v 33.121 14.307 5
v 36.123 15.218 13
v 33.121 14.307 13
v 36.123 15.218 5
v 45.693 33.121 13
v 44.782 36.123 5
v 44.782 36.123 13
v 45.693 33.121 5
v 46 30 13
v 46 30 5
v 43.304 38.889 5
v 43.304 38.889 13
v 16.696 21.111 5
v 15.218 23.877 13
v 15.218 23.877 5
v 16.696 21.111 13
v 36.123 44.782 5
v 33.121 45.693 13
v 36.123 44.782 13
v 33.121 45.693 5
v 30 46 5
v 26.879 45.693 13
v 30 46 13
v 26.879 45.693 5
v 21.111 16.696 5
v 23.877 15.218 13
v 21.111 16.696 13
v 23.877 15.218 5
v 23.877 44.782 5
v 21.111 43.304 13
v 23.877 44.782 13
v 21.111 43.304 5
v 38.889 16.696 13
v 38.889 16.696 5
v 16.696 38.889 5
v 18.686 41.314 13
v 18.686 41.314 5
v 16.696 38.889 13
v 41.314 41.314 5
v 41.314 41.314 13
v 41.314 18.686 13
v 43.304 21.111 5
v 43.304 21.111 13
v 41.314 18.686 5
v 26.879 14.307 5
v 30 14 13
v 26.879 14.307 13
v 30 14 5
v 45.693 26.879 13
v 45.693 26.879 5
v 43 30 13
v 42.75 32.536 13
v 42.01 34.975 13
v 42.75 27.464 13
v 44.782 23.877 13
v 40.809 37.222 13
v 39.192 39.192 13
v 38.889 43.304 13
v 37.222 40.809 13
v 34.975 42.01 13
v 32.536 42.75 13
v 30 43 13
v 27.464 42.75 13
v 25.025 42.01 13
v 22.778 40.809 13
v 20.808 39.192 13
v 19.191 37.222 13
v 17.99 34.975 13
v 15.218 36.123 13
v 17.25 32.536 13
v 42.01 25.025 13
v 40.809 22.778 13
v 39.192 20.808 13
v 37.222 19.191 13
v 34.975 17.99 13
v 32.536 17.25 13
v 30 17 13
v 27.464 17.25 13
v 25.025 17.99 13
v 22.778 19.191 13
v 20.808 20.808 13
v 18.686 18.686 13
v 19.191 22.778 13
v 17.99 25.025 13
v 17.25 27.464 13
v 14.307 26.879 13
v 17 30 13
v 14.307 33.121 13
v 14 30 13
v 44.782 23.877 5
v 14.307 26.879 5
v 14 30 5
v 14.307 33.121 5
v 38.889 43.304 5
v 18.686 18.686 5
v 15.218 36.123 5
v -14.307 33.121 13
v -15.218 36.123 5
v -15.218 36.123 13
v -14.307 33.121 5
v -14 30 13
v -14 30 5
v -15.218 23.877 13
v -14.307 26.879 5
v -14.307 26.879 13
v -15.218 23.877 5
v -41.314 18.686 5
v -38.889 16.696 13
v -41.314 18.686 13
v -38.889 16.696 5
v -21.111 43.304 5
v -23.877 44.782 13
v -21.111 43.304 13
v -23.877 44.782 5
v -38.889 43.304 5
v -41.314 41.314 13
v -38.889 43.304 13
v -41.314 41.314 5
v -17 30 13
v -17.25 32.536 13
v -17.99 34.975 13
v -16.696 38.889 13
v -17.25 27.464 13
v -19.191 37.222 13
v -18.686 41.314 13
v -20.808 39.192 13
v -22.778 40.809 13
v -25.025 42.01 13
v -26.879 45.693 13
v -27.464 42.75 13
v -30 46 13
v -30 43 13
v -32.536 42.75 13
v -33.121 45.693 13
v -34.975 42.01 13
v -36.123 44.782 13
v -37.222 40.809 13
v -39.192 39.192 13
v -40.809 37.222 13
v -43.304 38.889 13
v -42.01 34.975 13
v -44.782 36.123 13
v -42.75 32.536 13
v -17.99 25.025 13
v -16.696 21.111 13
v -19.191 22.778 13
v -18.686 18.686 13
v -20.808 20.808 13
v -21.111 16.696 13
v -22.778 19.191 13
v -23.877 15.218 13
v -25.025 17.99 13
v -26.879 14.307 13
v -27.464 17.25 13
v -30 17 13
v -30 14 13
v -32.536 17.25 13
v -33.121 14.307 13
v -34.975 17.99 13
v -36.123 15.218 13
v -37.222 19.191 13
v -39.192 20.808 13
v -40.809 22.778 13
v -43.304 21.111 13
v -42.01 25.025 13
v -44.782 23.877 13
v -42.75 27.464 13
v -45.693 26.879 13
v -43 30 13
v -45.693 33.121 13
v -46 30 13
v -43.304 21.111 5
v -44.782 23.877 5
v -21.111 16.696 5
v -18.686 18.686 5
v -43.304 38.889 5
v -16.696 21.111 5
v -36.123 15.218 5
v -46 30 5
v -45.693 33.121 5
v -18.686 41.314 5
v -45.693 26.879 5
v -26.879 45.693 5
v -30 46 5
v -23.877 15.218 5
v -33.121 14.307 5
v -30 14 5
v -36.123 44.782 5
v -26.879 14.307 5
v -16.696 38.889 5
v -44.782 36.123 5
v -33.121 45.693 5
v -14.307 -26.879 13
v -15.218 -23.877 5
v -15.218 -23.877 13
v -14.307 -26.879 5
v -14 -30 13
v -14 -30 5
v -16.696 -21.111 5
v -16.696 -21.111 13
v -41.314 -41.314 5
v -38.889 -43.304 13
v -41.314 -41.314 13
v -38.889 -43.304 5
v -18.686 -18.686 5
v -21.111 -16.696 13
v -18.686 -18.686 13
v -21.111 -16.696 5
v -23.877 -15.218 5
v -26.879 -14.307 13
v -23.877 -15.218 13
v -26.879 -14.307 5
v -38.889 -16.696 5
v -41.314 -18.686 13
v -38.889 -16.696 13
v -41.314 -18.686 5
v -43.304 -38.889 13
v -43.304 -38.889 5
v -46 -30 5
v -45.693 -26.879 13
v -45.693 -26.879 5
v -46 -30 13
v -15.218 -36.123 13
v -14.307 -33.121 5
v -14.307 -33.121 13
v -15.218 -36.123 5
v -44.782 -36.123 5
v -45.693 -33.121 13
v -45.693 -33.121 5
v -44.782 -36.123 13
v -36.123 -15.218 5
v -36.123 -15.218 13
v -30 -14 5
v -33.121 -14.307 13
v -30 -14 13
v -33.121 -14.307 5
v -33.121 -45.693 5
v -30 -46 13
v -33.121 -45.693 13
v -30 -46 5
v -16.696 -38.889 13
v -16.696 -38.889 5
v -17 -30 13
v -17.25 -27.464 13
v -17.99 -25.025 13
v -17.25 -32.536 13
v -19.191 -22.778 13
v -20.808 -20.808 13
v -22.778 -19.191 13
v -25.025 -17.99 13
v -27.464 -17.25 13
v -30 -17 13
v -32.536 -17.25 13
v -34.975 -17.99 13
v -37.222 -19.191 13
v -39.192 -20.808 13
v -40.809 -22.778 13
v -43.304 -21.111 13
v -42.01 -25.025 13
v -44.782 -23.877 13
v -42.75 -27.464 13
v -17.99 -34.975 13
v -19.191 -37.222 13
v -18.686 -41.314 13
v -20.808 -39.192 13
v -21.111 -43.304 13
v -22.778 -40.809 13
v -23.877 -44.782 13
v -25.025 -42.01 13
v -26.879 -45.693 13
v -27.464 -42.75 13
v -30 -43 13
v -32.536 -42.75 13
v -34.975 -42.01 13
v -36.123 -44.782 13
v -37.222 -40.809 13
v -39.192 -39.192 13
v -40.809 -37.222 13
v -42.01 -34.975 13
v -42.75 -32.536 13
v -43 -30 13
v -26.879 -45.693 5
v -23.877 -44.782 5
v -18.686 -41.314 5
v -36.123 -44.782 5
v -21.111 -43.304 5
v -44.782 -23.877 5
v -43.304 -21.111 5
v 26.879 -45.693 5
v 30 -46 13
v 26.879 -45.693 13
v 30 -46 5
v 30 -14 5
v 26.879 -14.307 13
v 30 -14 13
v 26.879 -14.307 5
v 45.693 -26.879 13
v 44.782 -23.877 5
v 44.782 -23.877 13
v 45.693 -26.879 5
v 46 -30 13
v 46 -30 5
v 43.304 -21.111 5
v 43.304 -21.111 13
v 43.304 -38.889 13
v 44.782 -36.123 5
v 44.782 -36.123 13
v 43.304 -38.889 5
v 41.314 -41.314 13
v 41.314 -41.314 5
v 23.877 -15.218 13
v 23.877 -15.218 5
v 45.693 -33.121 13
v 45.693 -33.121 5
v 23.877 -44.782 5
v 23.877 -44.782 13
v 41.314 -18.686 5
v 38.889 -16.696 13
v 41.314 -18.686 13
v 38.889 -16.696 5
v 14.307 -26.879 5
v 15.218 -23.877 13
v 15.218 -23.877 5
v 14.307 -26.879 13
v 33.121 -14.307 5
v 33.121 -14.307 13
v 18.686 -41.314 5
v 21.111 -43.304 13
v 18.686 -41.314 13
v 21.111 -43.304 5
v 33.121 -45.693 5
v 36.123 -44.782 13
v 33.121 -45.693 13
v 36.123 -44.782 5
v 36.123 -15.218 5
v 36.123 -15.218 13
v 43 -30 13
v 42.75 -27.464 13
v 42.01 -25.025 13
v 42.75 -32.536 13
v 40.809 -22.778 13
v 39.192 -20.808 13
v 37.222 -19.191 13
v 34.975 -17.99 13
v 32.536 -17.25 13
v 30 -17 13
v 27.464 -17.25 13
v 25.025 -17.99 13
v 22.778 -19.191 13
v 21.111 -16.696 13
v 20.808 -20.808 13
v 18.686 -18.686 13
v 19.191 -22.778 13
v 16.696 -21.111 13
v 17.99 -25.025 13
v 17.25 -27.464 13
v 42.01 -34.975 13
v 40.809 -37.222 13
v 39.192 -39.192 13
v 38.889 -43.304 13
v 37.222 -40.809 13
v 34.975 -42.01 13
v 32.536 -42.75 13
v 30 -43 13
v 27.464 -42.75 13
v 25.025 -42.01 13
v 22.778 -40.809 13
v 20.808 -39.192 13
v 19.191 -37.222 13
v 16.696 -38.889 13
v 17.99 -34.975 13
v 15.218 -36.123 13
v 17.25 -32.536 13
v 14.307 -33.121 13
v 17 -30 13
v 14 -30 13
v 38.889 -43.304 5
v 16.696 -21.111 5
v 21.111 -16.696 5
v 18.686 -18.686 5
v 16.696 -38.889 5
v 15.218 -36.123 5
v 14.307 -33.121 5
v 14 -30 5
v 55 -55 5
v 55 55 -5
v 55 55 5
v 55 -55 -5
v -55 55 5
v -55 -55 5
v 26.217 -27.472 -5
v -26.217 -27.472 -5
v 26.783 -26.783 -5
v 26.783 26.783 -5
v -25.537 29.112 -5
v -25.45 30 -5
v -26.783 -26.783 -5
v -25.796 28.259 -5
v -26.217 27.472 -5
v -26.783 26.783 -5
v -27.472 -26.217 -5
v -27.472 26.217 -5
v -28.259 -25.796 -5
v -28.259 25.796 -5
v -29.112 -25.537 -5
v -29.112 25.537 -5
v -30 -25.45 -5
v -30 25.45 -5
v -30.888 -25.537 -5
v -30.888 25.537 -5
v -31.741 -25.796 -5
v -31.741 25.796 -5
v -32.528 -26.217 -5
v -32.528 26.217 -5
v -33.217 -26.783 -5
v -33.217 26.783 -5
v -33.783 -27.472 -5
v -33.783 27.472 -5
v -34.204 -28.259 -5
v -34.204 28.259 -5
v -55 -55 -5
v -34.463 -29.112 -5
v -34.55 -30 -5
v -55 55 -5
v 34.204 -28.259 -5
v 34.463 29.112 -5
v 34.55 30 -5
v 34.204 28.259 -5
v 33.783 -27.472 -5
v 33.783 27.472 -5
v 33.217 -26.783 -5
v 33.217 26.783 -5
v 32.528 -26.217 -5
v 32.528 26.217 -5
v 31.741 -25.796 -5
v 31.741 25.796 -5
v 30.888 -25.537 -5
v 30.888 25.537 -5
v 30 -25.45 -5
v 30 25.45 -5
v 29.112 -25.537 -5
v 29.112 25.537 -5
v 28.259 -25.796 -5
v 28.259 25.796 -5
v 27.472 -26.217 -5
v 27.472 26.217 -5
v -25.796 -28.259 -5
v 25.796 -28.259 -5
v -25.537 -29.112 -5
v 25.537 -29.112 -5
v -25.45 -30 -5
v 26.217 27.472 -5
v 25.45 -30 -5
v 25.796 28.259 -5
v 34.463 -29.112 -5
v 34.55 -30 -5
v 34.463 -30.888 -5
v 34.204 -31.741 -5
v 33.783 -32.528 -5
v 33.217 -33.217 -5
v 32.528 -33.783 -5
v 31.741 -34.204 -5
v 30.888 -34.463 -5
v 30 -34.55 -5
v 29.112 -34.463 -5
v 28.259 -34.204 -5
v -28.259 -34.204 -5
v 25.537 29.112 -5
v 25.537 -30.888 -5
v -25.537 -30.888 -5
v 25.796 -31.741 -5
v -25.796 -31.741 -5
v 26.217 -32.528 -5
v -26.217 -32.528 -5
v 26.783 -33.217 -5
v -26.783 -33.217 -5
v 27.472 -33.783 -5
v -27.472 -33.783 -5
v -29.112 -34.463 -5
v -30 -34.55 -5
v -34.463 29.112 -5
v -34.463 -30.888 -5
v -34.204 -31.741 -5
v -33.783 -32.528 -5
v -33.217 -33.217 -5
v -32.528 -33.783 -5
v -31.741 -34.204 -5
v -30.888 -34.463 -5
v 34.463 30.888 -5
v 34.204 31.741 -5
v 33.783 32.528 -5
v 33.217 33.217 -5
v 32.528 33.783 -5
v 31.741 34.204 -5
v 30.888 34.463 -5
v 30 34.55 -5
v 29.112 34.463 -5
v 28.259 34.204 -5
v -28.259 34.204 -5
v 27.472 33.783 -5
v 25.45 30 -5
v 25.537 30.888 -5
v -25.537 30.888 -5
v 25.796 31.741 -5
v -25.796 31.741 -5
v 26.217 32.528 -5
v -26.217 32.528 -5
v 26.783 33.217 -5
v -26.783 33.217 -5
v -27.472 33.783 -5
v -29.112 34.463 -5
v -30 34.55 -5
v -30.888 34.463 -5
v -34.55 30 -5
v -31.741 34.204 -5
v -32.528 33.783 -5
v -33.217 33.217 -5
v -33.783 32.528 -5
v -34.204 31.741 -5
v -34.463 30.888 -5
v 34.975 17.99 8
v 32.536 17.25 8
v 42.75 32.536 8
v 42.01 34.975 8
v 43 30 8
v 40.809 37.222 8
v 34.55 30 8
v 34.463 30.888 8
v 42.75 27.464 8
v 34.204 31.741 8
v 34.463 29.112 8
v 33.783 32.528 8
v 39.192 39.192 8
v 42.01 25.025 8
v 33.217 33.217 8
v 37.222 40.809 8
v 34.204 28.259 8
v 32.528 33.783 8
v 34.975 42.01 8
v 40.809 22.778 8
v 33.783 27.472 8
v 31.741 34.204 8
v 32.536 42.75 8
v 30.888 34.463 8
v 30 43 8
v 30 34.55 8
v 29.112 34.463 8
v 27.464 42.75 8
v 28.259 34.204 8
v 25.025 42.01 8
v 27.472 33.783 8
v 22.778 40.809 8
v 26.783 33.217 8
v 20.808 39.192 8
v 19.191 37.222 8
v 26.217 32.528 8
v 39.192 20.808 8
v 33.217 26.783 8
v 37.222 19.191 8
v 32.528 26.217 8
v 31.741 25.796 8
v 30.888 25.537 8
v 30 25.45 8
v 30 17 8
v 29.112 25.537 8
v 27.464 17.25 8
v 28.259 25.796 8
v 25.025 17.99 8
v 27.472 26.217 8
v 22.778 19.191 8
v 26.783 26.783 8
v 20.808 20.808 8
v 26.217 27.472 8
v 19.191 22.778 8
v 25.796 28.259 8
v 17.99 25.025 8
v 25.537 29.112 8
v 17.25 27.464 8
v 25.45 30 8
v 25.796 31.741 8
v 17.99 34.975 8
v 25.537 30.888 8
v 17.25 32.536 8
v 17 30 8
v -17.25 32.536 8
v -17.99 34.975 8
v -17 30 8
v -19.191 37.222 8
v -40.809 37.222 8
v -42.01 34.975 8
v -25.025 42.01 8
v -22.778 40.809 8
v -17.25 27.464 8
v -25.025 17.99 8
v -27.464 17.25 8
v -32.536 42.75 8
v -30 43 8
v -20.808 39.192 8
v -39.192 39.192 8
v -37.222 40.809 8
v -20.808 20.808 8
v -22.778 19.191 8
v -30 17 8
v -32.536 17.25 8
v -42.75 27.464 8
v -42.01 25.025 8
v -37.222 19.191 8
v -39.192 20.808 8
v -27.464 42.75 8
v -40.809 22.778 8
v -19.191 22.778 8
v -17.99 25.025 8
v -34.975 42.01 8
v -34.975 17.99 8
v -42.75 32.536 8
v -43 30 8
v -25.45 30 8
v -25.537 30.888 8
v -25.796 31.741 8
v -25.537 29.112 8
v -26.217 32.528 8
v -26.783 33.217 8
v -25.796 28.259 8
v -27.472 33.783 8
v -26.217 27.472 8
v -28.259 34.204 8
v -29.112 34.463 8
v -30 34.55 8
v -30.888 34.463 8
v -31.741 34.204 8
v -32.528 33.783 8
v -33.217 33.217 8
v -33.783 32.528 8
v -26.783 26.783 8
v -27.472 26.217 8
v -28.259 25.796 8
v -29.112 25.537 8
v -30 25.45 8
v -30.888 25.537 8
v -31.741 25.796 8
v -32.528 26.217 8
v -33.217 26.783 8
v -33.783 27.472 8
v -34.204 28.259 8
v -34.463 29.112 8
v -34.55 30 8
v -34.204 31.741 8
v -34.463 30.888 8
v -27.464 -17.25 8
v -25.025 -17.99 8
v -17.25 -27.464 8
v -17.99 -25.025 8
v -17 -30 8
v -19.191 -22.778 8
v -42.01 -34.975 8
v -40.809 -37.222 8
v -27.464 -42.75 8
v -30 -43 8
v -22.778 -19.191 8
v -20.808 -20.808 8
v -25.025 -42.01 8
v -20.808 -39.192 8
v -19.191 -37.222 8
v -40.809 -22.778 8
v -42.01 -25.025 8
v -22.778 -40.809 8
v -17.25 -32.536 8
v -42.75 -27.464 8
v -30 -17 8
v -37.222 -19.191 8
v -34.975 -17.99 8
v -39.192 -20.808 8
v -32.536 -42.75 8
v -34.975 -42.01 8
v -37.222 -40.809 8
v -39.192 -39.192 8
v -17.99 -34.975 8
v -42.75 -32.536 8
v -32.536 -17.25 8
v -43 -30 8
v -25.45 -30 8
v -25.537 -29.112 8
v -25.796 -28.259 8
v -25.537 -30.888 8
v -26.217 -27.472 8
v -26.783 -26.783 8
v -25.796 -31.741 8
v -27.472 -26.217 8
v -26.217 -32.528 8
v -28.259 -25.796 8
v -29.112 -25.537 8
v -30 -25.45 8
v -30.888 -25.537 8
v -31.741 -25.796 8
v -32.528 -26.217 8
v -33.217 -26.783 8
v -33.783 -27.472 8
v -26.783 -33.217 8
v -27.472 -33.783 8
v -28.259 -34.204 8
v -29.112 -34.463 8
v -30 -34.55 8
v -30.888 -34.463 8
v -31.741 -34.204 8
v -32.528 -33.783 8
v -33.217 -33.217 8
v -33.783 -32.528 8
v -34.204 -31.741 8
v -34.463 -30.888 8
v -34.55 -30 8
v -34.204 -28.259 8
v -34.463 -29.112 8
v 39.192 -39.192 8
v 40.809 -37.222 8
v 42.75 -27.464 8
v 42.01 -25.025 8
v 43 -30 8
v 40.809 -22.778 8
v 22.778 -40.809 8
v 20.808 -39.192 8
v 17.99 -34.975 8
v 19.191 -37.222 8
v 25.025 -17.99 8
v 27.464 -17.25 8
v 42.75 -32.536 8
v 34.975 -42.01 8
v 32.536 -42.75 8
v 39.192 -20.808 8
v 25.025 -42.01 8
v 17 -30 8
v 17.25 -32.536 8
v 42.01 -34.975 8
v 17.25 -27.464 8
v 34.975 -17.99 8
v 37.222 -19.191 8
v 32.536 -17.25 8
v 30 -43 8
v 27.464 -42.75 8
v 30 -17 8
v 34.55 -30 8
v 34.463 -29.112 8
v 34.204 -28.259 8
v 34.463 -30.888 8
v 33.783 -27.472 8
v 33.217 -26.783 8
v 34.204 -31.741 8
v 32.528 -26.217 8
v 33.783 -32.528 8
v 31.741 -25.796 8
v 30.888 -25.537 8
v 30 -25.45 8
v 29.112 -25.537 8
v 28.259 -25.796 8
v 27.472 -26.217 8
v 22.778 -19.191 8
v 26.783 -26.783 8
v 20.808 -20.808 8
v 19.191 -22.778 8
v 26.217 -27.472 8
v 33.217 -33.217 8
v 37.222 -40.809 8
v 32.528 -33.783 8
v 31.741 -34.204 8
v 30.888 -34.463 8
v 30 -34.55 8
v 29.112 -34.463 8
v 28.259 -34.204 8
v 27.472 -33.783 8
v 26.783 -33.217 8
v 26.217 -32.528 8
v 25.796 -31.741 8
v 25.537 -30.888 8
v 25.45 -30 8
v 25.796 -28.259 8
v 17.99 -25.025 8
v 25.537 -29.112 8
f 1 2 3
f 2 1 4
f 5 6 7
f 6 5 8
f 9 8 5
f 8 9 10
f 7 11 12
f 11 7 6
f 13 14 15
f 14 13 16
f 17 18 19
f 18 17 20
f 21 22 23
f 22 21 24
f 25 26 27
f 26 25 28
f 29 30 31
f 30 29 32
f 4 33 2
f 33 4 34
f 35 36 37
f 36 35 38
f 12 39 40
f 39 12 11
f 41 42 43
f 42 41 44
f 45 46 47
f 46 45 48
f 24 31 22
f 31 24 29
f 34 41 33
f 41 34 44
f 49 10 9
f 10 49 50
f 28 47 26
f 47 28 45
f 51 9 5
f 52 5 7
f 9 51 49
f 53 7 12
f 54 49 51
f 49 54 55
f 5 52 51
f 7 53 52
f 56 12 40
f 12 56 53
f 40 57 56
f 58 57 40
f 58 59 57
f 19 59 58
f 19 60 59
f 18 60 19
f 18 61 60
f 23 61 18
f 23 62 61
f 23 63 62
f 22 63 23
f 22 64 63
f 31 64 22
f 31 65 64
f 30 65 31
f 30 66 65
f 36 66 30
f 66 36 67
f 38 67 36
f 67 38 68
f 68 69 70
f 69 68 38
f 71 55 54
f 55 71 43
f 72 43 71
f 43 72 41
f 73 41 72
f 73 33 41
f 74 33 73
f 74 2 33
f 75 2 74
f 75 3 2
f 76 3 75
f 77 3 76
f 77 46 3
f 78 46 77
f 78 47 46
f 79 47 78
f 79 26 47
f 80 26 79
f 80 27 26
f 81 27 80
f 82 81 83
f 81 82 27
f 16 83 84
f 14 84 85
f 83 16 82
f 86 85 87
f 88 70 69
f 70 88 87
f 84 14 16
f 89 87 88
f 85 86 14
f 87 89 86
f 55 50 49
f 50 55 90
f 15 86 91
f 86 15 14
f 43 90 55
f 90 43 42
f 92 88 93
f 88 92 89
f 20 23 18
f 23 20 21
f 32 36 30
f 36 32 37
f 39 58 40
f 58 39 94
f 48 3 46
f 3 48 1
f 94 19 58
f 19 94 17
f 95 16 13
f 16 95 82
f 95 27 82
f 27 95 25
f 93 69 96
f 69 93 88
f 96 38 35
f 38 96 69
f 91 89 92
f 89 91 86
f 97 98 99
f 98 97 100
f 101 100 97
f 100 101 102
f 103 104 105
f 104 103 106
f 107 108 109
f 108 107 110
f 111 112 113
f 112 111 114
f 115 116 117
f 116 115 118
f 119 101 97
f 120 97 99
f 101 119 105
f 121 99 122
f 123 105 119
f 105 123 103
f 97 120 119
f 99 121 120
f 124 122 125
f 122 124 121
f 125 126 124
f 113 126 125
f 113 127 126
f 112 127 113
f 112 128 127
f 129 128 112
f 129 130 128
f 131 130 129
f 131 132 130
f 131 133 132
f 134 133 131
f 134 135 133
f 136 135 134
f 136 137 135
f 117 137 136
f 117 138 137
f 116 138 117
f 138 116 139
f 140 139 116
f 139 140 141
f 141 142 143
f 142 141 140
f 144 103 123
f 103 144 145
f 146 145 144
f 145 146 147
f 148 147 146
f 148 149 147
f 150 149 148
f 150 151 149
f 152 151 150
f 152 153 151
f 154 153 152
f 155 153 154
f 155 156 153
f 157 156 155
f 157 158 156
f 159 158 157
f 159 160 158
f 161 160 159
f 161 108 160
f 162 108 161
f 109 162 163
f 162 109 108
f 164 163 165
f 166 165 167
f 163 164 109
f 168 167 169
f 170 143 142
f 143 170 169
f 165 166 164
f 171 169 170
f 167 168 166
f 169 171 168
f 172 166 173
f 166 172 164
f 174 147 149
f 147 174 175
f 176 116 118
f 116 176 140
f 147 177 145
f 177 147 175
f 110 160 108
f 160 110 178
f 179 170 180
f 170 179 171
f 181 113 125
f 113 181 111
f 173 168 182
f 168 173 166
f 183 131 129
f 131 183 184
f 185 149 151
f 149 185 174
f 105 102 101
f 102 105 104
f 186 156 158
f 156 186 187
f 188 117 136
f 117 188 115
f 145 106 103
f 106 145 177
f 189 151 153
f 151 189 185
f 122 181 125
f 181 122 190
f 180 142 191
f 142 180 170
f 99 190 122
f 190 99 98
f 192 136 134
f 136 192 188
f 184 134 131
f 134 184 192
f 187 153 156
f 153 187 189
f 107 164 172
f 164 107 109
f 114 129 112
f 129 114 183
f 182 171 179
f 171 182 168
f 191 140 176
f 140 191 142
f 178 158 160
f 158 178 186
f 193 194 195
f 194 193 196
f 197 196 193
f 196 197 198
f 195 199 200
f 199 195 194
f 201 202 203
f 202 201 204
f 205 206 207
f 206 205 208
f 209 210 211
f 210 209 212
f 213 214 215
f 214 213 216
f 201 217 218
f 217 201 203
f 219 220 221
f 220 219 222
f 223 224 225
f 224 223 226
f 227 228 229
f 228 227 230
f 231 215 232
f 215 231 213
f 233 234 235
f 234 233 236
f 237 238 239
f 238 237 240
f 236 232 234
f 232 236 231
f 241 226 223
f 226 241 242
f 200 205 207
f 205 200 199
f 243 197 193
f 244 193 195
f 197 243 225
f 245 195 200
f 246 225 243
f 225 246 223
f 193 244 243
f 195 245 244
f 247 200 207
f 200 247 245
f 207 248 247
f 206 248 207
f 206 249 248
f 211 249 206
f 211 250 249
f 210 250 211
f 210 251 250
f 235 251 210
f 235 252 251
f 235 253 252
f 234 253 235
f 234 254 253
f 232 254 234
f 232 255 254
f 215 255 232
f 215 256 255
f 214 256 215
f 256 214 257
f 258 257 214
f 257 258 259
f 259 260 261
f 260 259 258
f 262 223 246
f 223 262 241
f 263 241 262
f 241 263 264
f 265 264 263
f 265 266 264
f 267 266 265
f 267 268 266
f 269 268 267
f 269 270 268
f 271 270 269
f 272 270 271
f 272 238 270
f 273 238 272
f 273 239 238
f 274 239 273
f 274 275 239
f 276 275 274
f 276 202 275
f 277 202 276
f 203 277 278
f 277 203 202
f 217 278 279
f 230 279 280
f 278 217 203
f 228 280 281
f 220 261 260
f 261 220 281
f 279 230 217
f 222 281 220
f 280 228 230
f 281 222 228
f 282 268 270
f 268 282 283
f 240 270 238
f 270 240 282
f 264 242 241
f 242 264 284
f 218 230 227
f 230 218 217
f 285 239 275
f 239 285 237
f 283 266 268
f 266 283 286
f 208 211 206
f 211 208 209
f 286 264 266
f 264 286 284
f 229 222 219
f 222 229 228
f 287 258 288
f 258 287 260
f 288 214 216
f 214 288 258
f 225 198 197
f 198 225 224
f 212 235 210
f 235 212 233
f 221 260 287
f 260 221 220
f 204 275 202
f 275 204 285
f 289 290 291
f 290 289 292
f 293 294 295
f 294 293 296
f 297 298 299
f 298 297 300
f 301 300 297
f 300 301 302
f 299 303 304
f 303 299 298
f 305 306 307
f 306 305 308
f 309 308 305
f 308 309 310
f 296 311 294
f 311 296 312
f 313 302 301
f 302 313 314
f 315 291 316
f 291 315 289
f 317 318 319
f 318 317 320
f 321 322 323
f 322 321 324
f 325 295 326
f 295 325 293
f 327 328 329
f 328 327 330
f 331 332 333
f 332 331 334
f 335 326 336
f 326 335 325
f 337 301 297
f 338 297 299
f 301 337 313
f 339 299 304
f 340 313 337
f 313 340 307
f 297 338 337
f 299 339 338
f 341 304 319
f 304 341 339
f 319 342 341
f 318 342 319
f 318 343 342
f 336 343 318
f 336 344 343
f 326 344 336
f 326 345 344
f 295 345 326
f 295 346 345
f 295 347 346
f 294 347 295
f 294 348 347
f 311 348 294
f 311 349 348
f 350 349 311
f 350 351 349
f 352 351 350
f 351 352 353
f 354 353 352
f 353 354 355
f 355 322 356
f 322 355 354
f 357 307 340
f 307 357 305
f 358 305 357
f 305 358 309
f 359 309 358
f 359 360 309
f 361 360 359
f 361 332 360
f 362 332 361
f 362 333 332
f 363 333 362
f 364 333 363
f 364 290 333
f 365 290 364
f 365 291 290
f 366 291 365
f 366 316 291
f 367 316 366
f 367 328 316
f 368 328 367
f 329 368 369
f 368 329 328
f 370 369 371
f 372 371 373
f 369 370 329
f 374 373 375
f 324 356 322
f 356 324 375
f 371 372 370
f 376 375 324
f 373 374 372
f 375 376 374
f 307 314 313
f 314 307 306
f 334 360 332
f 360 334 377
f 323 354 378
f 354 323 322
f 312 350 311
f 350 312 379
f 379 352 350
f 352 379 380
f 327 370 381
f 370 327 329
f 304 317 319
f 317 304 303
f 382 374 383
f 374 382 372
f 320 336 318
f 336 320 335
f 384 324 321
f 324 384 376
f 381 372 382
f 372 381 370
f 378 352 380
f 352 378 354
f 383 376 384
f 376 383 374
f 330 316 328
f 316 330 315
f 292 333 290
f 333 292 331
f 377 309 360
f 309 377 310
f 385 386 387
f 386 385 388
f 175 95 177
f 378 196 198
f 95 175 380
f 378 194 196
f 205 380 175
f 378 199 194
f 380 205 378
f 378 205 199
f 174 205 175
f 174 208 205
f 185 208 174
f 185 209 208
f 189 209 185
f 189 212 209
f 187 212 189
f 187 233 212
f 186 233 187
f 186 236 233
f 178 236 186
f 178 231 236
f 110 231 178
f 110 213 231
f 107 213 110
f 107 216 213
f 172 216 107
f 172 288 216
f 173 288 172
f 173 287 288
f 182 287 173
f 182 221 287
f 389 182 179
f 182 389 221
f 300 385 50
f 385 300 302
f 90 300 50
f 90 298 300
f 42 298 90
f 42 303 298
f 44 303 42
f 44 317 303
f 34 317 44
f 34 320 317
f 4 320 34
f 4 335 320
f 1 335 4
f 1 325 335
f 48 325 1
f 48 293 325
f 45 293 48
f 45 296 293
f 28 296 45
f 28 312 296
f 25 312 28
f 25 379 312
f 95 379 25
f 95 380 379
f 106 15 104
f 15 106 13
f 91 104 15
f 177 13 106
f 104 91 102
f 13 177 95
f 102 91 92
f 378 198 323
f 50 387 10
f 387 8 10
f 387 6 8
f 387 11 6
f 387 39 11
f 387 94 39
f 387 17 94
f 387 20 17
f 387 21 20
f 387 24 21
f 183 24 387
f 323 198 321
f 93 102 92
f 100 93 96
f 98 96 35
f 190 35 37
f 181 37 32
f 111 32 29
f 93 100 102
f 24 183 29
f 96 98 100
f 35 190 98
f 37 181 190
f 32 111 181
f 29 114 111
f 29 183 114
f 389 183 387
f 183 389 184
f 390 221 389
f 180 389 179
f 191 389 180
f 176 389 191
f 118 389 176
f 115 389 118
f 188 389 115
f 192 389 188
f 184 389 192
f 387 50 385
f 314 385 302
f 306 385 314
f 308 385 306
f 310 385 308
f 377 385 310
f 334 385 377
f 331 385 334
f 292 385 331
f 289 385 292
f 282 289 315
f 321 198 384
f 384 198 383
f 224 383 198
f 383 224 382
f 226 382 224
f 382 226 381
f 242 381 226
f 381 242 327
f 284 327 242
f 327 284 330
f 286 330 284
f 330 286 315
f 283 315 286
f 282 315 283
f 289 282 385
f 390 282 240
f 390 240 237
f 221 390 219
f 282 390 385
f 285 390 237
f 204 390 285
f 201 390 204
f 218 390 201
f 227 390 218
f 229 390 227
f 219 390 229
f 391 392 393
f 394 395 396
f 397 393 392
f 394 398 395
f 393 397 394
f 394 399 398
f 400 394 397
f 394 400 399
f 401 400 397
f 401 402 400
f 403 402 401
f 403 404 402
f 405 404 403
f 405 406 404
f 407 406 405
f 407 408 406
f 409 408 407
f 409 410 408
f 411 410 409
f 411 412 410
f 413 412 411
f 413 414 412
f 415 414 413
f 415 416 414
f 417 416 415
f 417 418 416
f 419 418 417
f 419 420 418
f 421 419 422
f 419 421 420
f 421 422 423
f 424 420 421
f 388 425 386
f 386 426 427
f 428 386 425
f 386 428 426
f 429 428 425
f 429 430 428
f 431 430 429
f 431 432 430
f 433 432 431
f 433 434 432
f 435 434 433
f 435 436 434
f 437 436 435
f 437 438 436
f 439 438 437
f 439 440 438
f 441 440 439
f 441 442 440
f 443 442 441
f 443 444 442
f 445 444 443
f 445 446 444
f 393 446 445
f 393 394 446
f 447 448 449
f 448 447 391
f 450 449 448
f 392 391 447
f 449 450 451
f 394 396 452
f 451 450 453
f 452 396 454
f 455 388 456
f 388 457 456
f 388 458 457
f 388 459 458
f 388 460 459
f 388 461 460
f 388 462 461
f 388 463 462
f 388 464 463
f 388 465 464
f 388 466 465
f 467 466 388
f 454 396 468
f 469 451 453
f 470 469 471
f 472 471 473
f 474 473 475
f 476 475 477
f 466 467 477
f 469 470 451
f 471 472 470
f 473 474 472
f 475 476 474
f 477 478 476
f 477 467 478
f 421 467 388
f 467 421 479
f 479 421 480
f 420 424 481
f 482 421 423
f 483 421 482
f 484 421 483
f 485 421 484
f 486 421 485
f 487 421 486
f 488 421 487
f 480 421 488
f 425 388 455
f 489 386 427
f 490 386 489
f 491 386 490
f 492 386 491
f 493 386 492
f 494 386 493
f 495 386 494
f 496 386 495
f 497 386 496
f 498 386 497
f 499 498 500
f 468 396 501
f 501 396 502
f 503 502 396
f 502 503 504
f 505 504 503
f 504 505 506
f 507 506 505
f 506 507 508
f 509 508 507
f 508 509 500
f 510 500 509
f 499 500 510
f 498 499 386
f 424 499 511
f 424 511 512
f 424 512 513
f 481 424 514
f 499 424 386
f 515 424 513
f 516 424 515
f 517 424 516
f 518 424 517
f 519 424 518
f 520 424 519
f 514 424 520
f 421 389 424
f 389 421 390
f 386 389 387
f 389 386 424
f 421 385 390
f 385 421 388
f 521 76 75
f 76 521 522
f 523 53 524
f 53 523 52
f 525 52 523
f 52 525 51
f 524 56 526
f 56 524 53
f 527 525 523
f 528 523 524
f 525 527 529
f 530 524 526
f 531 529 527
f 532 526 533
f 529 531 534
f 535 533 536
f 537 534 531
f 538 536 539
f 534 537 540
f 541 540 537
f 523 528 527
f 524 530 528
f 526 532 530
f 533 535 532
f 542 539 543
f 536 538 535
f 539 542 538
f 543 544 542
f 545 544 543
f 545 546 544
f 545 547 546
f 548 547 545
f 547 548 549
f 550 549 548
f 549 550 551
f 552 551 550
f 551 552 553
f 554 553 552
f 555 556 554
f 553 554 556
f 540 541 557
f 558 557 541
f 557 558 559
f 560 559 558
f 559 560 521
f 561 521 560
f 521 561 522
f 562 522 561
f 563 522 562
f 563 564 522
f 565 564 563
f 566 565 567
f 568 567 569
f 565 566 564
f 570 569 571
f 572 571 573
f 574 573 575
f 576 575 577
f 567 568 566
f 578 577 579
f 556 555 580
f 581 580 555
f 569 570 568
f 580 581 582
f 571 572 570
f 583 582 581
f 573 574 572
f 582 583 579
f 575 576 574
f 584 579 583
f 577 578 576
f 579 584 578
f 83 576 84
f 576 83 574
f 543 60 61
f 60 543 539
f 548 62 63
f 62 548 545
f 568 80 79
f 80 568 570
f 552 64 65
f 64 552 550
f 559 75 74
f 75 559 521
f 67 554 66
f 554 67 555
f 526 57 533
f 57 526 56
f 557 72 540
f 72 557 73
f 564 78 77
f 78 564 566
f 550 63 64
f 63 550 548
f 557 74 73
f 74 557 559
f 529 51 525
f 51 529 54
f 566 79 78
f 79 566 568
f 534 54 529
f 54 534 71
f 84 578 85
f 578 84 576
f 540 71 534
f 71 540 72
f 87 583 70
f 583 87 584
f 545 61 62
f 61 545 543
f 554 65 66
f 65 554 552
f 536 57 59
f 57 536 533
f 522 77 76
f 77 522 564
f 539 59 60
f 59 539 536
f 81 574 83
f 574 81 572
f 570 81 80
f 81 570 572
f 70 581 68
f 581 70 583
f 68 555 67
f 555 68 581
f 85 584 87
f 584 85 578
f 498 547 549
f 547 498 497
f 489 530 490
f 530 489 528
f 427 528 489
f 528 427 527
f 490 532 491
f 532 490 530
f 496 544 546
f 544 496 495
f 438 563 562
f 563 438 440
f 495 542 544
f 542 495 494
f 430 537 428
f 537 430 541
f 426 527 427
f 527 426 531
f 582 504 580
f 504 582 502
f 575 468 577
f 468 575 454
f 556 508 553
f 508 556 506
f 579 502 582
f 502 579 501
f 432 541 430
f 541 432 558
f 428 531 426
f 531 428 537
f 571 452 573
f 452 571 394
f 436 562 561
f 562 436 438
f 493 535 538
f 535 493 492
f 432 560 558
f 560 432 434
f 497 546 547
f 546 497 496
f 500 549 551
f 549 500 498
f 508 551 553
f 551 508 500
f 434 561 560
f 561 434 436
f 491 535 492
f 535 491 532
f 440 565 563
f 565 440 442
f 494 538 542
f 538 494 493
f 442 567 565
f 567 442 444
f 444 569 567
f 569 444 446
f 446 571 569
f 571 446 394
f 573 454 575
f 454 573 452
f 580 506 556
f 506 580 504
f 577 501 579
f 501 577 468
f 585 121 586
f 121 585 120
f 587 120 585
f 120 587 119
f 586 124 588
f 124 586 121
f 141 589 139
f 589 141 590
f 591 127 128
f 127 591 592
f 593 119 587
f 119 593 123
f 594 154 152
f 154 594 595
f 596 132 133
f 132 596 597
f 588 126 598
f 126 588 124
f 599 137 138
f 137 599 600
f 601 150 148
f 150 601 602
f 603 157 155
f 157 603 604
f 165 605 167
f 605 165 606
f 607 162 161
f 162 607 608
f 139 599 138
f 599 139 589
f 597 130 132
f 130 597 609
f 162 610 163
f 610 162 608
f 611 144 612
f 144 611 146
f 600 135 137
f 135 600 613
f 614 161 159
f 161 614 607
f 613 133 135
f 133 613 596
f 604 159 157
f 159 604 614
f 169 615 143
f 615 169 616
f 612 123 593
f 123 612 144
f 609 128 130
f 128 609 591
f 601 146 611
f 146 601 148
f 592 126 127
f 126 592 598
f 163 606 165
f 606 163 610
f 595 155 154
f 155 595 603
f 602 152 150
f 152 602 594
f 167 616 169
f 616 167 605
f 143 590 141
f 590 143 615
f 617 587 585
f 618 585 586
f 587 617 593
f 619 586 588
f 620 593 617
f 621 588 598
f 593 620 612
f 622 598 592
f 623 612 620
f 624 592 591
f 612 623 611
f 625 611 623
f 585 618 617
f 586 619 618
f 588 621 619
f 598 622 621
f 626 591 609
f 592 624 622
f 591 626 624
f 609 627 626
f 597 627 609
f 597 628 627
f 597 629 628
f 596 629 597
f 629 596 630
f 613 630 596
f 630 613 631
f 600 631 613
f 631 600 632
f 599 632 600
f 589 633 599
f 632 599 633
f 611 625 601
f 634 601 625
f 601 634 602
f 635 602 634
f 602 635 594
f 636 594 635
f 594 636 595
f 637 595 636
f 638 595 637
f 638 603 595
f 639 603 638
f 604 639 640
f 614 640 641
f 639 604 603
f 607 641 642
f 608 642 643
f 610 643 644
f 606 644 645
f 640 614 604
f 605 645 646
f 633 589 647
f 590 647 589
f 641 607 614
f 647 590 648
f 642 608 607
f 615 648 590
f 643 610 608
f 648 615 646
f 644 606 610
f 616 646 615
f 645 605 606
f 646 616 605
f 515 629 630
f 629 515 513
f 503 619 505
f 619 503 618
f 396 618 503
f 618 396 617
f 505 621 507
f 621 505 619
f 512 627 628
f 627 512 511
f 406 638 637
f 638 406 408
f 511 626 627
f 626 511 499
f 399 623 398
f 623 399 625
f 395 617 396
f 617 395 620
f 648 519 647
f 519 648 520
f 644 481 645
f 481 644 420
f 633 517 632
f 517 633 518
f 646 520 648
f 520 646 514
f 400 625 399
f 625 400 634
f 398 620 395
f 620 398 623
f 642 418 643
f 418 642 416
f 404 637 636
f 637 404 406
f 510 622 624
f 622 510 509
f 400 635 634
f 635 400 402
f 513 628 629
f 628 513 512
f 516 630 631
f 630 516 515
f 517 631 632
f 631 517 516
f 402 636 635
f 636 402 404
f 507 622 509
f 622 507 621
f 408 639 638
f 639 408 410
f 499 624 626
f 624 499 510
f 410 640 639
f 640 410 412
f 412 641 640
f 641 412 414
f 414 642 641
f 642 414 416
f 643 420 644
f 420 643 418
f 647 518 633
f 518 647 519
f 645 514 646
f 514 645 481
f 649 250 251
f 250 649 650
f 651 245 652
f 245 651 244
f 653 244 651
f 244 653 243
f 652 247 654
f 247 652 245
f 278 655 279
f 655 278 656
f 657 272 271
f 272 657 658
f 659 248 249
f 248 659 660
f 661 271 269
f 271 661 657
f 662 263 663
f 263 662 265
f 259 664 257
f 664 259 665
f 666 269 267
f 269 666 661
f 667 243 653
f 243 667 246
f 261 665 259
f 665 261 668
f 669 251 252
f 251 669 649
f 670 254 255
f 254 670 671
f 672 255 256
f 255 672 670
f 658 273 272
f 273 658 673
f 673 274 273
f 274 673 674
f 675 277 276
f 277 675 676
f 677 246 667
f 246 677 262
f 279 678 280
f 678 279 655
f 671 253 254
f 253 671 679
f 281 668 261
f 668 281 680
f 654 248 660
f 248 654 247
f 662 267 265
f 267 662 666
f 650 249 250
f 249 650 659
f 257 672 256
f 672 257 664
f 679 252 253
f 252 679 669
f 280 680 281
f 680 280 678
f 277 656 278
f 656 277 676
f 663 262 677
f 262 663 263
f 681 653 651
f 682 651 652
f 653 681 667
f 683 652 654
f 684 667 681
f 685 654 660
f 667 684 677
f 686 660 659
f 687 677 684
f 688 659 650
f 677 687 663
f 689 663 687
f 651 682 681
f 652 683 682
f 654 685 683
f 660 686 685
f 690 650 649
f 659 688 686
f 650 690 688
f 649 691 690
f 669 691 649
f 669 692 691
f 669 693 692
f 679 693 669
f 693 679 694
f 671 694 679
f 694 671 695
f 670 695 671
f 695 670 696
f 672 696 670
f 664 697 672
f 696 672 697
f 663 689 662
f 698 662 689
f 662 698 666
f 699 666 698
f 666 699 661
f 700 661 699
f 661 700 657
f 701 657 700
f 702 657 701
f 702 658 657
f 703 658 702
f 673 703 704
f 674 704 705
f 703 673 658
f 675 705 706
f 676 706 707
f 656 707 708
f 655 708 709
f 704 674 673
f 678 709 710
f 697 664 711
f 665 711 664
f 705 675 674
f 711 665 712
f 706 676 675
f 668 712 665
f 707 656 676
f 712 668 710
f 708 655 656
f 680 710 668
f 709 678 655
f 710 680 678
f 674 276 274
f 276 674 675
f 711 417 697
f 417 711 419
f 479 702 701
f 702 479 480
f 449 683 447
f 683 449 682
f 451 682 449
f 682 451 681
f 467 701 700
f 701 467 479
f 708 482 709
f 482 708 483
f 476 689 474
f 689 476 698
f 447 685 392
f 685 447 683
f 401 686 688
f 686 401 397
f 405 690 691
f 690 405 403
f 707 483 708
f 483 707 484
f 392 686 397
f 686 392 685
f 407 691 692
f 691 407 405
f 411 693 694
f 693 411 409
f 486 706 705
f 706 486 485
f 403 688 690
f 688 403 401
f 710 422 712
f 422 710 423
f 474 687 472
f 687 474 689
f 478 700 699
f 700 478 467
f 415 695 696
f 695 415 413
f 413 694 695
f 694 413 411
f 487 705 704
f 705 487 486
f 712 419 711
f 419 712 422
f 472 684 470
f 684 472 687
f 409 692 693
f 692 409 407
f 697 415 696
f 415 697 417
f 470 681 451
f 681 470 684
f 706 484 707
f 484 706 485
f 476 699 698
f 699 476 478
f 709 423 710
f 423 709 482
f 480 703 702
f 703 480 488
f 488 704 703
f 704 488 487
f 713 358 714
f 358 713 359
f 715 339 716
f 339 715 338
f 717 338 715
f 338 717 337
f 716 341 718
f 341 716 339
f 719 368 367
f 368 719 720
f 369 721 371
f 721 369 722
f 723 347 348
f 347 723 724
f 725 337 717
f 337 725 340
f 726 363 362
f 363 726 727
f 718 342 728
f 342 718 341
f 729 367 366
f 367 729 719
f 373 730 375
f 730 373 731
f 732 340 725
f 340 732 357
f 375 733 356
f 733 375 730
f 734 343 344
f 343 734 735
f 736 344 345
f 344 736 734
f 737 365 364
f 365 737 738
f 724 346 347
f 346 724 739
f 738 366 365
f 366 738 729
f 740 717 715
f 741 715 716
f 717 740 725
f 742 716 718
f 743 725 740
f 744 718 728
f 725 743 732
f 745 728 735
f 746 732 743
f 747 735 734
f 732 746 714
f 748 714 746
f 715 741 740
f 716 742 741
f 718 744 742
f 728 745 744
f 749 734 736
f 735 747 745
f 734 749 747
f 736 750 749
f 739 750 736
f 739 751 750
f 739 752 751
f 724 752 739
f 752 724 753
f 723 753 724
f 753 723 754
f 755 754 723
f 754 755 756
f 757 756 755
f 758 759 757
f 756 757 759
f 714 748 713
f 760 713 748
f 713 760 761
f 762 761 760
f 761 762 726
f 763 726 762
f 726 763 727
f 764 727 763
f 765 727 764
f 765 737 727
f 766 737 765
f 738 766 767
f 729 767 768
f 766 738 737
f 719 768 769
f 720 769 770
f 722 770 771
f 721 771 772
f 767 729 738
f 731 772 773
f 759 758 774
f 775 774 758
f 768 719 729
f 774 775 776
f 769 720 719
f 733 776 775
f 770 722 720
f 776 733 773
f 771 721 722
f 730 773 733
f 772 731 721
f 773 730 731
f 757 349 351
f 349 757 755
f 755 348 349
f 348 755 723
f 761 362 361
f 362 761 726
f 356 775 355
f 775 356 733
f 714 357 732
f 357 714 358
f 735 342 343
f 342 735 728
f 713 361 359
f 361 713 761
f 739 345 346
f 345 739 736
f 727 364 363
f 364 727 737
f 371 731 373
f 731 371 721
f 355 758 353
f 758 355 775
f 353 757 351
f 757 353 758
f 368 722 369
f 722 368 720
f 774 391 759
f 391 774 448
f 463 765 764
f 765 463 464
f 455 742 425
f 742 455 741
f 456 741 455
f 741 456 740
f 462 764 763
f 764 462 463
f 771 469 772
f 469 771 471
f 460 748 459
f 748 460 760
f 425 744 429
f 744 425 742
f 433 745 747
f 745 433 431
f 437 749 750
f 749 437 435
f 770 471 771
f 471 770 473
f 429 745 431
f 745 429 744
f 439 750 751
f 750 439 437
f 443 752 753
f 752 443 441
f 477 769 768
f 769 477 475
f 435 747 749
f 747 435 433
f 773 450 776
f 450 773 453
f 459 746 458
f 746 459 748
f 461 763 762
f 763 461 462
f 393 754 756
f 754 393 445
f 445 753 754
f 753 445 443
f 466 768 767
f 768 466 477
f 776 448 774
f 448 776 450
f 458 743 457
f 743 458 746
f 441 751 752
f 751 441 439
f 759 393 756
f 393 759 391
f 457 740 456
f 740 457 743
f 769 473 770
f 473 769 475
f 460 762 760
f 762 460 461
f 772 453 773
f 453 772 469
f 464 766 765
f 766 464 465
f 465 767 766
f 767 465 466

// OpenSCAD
$fn = 32;

// ----------------------------------------------------------------------
// Socket pad plate
// bosses with counterbored sockets for the screws
// ----------------------------------------------------------------------

// --- parameters (mm) ---
base_t = 10;             // base plate thickness
boss_h = 8;              // boss height above the base plate
boss_d = 32;             // boss diameter
socket_d = 26;           // socket diameter
socket_depth = 5;        // socket depth from the boss face
bolt_d = 9.1;            // screw clearance hole through the socket floor
plate = [110, 110, 10];  // overall size (x, y, z)
edge = 25;               // boss centre offset from the plate edge
pads = 4;                // boss count, one per corner

// --- derived feature positions (mm) ---
height = base_t + boss_h;        // = 18   overall height of the part
corner_x = plate[0] / 2 - edge;  // = 30   boss centre X
corner_y = plate[1] / 2 - edge;  // = 30   boss centre Y
feature_centers = [
  [corner_x, corner_y],
  [-corner_x, corner_y],
  [-corner_x, -corner_y],
  [corner_x, -corner_y]
];   // boss centres: sockets, holes and the pads themselves are placed from here

// base plate, bosses on feature_centers, socket + through hole in each
difference() {
  union() {
    cube(plate, center = true);
    for (centre = feature_centers)
      translate([centre[0], centre[1], plate[2] / 2 - 1])
        cylinder(d = boss_d, h = boss_h + 1);
  }
  for (centre = feature_centers) {
    translate([centre[0], centre[1], plate[2] / 2 + boss_h - socket_depth])
      cylinder(d = socket_d, h = socket_depth + 1);
    translate([centre[0], centre[1], -height])
      cylinder(d = bolt_d, h = 2 * height + 2);  // through the socket floor
  }
}
